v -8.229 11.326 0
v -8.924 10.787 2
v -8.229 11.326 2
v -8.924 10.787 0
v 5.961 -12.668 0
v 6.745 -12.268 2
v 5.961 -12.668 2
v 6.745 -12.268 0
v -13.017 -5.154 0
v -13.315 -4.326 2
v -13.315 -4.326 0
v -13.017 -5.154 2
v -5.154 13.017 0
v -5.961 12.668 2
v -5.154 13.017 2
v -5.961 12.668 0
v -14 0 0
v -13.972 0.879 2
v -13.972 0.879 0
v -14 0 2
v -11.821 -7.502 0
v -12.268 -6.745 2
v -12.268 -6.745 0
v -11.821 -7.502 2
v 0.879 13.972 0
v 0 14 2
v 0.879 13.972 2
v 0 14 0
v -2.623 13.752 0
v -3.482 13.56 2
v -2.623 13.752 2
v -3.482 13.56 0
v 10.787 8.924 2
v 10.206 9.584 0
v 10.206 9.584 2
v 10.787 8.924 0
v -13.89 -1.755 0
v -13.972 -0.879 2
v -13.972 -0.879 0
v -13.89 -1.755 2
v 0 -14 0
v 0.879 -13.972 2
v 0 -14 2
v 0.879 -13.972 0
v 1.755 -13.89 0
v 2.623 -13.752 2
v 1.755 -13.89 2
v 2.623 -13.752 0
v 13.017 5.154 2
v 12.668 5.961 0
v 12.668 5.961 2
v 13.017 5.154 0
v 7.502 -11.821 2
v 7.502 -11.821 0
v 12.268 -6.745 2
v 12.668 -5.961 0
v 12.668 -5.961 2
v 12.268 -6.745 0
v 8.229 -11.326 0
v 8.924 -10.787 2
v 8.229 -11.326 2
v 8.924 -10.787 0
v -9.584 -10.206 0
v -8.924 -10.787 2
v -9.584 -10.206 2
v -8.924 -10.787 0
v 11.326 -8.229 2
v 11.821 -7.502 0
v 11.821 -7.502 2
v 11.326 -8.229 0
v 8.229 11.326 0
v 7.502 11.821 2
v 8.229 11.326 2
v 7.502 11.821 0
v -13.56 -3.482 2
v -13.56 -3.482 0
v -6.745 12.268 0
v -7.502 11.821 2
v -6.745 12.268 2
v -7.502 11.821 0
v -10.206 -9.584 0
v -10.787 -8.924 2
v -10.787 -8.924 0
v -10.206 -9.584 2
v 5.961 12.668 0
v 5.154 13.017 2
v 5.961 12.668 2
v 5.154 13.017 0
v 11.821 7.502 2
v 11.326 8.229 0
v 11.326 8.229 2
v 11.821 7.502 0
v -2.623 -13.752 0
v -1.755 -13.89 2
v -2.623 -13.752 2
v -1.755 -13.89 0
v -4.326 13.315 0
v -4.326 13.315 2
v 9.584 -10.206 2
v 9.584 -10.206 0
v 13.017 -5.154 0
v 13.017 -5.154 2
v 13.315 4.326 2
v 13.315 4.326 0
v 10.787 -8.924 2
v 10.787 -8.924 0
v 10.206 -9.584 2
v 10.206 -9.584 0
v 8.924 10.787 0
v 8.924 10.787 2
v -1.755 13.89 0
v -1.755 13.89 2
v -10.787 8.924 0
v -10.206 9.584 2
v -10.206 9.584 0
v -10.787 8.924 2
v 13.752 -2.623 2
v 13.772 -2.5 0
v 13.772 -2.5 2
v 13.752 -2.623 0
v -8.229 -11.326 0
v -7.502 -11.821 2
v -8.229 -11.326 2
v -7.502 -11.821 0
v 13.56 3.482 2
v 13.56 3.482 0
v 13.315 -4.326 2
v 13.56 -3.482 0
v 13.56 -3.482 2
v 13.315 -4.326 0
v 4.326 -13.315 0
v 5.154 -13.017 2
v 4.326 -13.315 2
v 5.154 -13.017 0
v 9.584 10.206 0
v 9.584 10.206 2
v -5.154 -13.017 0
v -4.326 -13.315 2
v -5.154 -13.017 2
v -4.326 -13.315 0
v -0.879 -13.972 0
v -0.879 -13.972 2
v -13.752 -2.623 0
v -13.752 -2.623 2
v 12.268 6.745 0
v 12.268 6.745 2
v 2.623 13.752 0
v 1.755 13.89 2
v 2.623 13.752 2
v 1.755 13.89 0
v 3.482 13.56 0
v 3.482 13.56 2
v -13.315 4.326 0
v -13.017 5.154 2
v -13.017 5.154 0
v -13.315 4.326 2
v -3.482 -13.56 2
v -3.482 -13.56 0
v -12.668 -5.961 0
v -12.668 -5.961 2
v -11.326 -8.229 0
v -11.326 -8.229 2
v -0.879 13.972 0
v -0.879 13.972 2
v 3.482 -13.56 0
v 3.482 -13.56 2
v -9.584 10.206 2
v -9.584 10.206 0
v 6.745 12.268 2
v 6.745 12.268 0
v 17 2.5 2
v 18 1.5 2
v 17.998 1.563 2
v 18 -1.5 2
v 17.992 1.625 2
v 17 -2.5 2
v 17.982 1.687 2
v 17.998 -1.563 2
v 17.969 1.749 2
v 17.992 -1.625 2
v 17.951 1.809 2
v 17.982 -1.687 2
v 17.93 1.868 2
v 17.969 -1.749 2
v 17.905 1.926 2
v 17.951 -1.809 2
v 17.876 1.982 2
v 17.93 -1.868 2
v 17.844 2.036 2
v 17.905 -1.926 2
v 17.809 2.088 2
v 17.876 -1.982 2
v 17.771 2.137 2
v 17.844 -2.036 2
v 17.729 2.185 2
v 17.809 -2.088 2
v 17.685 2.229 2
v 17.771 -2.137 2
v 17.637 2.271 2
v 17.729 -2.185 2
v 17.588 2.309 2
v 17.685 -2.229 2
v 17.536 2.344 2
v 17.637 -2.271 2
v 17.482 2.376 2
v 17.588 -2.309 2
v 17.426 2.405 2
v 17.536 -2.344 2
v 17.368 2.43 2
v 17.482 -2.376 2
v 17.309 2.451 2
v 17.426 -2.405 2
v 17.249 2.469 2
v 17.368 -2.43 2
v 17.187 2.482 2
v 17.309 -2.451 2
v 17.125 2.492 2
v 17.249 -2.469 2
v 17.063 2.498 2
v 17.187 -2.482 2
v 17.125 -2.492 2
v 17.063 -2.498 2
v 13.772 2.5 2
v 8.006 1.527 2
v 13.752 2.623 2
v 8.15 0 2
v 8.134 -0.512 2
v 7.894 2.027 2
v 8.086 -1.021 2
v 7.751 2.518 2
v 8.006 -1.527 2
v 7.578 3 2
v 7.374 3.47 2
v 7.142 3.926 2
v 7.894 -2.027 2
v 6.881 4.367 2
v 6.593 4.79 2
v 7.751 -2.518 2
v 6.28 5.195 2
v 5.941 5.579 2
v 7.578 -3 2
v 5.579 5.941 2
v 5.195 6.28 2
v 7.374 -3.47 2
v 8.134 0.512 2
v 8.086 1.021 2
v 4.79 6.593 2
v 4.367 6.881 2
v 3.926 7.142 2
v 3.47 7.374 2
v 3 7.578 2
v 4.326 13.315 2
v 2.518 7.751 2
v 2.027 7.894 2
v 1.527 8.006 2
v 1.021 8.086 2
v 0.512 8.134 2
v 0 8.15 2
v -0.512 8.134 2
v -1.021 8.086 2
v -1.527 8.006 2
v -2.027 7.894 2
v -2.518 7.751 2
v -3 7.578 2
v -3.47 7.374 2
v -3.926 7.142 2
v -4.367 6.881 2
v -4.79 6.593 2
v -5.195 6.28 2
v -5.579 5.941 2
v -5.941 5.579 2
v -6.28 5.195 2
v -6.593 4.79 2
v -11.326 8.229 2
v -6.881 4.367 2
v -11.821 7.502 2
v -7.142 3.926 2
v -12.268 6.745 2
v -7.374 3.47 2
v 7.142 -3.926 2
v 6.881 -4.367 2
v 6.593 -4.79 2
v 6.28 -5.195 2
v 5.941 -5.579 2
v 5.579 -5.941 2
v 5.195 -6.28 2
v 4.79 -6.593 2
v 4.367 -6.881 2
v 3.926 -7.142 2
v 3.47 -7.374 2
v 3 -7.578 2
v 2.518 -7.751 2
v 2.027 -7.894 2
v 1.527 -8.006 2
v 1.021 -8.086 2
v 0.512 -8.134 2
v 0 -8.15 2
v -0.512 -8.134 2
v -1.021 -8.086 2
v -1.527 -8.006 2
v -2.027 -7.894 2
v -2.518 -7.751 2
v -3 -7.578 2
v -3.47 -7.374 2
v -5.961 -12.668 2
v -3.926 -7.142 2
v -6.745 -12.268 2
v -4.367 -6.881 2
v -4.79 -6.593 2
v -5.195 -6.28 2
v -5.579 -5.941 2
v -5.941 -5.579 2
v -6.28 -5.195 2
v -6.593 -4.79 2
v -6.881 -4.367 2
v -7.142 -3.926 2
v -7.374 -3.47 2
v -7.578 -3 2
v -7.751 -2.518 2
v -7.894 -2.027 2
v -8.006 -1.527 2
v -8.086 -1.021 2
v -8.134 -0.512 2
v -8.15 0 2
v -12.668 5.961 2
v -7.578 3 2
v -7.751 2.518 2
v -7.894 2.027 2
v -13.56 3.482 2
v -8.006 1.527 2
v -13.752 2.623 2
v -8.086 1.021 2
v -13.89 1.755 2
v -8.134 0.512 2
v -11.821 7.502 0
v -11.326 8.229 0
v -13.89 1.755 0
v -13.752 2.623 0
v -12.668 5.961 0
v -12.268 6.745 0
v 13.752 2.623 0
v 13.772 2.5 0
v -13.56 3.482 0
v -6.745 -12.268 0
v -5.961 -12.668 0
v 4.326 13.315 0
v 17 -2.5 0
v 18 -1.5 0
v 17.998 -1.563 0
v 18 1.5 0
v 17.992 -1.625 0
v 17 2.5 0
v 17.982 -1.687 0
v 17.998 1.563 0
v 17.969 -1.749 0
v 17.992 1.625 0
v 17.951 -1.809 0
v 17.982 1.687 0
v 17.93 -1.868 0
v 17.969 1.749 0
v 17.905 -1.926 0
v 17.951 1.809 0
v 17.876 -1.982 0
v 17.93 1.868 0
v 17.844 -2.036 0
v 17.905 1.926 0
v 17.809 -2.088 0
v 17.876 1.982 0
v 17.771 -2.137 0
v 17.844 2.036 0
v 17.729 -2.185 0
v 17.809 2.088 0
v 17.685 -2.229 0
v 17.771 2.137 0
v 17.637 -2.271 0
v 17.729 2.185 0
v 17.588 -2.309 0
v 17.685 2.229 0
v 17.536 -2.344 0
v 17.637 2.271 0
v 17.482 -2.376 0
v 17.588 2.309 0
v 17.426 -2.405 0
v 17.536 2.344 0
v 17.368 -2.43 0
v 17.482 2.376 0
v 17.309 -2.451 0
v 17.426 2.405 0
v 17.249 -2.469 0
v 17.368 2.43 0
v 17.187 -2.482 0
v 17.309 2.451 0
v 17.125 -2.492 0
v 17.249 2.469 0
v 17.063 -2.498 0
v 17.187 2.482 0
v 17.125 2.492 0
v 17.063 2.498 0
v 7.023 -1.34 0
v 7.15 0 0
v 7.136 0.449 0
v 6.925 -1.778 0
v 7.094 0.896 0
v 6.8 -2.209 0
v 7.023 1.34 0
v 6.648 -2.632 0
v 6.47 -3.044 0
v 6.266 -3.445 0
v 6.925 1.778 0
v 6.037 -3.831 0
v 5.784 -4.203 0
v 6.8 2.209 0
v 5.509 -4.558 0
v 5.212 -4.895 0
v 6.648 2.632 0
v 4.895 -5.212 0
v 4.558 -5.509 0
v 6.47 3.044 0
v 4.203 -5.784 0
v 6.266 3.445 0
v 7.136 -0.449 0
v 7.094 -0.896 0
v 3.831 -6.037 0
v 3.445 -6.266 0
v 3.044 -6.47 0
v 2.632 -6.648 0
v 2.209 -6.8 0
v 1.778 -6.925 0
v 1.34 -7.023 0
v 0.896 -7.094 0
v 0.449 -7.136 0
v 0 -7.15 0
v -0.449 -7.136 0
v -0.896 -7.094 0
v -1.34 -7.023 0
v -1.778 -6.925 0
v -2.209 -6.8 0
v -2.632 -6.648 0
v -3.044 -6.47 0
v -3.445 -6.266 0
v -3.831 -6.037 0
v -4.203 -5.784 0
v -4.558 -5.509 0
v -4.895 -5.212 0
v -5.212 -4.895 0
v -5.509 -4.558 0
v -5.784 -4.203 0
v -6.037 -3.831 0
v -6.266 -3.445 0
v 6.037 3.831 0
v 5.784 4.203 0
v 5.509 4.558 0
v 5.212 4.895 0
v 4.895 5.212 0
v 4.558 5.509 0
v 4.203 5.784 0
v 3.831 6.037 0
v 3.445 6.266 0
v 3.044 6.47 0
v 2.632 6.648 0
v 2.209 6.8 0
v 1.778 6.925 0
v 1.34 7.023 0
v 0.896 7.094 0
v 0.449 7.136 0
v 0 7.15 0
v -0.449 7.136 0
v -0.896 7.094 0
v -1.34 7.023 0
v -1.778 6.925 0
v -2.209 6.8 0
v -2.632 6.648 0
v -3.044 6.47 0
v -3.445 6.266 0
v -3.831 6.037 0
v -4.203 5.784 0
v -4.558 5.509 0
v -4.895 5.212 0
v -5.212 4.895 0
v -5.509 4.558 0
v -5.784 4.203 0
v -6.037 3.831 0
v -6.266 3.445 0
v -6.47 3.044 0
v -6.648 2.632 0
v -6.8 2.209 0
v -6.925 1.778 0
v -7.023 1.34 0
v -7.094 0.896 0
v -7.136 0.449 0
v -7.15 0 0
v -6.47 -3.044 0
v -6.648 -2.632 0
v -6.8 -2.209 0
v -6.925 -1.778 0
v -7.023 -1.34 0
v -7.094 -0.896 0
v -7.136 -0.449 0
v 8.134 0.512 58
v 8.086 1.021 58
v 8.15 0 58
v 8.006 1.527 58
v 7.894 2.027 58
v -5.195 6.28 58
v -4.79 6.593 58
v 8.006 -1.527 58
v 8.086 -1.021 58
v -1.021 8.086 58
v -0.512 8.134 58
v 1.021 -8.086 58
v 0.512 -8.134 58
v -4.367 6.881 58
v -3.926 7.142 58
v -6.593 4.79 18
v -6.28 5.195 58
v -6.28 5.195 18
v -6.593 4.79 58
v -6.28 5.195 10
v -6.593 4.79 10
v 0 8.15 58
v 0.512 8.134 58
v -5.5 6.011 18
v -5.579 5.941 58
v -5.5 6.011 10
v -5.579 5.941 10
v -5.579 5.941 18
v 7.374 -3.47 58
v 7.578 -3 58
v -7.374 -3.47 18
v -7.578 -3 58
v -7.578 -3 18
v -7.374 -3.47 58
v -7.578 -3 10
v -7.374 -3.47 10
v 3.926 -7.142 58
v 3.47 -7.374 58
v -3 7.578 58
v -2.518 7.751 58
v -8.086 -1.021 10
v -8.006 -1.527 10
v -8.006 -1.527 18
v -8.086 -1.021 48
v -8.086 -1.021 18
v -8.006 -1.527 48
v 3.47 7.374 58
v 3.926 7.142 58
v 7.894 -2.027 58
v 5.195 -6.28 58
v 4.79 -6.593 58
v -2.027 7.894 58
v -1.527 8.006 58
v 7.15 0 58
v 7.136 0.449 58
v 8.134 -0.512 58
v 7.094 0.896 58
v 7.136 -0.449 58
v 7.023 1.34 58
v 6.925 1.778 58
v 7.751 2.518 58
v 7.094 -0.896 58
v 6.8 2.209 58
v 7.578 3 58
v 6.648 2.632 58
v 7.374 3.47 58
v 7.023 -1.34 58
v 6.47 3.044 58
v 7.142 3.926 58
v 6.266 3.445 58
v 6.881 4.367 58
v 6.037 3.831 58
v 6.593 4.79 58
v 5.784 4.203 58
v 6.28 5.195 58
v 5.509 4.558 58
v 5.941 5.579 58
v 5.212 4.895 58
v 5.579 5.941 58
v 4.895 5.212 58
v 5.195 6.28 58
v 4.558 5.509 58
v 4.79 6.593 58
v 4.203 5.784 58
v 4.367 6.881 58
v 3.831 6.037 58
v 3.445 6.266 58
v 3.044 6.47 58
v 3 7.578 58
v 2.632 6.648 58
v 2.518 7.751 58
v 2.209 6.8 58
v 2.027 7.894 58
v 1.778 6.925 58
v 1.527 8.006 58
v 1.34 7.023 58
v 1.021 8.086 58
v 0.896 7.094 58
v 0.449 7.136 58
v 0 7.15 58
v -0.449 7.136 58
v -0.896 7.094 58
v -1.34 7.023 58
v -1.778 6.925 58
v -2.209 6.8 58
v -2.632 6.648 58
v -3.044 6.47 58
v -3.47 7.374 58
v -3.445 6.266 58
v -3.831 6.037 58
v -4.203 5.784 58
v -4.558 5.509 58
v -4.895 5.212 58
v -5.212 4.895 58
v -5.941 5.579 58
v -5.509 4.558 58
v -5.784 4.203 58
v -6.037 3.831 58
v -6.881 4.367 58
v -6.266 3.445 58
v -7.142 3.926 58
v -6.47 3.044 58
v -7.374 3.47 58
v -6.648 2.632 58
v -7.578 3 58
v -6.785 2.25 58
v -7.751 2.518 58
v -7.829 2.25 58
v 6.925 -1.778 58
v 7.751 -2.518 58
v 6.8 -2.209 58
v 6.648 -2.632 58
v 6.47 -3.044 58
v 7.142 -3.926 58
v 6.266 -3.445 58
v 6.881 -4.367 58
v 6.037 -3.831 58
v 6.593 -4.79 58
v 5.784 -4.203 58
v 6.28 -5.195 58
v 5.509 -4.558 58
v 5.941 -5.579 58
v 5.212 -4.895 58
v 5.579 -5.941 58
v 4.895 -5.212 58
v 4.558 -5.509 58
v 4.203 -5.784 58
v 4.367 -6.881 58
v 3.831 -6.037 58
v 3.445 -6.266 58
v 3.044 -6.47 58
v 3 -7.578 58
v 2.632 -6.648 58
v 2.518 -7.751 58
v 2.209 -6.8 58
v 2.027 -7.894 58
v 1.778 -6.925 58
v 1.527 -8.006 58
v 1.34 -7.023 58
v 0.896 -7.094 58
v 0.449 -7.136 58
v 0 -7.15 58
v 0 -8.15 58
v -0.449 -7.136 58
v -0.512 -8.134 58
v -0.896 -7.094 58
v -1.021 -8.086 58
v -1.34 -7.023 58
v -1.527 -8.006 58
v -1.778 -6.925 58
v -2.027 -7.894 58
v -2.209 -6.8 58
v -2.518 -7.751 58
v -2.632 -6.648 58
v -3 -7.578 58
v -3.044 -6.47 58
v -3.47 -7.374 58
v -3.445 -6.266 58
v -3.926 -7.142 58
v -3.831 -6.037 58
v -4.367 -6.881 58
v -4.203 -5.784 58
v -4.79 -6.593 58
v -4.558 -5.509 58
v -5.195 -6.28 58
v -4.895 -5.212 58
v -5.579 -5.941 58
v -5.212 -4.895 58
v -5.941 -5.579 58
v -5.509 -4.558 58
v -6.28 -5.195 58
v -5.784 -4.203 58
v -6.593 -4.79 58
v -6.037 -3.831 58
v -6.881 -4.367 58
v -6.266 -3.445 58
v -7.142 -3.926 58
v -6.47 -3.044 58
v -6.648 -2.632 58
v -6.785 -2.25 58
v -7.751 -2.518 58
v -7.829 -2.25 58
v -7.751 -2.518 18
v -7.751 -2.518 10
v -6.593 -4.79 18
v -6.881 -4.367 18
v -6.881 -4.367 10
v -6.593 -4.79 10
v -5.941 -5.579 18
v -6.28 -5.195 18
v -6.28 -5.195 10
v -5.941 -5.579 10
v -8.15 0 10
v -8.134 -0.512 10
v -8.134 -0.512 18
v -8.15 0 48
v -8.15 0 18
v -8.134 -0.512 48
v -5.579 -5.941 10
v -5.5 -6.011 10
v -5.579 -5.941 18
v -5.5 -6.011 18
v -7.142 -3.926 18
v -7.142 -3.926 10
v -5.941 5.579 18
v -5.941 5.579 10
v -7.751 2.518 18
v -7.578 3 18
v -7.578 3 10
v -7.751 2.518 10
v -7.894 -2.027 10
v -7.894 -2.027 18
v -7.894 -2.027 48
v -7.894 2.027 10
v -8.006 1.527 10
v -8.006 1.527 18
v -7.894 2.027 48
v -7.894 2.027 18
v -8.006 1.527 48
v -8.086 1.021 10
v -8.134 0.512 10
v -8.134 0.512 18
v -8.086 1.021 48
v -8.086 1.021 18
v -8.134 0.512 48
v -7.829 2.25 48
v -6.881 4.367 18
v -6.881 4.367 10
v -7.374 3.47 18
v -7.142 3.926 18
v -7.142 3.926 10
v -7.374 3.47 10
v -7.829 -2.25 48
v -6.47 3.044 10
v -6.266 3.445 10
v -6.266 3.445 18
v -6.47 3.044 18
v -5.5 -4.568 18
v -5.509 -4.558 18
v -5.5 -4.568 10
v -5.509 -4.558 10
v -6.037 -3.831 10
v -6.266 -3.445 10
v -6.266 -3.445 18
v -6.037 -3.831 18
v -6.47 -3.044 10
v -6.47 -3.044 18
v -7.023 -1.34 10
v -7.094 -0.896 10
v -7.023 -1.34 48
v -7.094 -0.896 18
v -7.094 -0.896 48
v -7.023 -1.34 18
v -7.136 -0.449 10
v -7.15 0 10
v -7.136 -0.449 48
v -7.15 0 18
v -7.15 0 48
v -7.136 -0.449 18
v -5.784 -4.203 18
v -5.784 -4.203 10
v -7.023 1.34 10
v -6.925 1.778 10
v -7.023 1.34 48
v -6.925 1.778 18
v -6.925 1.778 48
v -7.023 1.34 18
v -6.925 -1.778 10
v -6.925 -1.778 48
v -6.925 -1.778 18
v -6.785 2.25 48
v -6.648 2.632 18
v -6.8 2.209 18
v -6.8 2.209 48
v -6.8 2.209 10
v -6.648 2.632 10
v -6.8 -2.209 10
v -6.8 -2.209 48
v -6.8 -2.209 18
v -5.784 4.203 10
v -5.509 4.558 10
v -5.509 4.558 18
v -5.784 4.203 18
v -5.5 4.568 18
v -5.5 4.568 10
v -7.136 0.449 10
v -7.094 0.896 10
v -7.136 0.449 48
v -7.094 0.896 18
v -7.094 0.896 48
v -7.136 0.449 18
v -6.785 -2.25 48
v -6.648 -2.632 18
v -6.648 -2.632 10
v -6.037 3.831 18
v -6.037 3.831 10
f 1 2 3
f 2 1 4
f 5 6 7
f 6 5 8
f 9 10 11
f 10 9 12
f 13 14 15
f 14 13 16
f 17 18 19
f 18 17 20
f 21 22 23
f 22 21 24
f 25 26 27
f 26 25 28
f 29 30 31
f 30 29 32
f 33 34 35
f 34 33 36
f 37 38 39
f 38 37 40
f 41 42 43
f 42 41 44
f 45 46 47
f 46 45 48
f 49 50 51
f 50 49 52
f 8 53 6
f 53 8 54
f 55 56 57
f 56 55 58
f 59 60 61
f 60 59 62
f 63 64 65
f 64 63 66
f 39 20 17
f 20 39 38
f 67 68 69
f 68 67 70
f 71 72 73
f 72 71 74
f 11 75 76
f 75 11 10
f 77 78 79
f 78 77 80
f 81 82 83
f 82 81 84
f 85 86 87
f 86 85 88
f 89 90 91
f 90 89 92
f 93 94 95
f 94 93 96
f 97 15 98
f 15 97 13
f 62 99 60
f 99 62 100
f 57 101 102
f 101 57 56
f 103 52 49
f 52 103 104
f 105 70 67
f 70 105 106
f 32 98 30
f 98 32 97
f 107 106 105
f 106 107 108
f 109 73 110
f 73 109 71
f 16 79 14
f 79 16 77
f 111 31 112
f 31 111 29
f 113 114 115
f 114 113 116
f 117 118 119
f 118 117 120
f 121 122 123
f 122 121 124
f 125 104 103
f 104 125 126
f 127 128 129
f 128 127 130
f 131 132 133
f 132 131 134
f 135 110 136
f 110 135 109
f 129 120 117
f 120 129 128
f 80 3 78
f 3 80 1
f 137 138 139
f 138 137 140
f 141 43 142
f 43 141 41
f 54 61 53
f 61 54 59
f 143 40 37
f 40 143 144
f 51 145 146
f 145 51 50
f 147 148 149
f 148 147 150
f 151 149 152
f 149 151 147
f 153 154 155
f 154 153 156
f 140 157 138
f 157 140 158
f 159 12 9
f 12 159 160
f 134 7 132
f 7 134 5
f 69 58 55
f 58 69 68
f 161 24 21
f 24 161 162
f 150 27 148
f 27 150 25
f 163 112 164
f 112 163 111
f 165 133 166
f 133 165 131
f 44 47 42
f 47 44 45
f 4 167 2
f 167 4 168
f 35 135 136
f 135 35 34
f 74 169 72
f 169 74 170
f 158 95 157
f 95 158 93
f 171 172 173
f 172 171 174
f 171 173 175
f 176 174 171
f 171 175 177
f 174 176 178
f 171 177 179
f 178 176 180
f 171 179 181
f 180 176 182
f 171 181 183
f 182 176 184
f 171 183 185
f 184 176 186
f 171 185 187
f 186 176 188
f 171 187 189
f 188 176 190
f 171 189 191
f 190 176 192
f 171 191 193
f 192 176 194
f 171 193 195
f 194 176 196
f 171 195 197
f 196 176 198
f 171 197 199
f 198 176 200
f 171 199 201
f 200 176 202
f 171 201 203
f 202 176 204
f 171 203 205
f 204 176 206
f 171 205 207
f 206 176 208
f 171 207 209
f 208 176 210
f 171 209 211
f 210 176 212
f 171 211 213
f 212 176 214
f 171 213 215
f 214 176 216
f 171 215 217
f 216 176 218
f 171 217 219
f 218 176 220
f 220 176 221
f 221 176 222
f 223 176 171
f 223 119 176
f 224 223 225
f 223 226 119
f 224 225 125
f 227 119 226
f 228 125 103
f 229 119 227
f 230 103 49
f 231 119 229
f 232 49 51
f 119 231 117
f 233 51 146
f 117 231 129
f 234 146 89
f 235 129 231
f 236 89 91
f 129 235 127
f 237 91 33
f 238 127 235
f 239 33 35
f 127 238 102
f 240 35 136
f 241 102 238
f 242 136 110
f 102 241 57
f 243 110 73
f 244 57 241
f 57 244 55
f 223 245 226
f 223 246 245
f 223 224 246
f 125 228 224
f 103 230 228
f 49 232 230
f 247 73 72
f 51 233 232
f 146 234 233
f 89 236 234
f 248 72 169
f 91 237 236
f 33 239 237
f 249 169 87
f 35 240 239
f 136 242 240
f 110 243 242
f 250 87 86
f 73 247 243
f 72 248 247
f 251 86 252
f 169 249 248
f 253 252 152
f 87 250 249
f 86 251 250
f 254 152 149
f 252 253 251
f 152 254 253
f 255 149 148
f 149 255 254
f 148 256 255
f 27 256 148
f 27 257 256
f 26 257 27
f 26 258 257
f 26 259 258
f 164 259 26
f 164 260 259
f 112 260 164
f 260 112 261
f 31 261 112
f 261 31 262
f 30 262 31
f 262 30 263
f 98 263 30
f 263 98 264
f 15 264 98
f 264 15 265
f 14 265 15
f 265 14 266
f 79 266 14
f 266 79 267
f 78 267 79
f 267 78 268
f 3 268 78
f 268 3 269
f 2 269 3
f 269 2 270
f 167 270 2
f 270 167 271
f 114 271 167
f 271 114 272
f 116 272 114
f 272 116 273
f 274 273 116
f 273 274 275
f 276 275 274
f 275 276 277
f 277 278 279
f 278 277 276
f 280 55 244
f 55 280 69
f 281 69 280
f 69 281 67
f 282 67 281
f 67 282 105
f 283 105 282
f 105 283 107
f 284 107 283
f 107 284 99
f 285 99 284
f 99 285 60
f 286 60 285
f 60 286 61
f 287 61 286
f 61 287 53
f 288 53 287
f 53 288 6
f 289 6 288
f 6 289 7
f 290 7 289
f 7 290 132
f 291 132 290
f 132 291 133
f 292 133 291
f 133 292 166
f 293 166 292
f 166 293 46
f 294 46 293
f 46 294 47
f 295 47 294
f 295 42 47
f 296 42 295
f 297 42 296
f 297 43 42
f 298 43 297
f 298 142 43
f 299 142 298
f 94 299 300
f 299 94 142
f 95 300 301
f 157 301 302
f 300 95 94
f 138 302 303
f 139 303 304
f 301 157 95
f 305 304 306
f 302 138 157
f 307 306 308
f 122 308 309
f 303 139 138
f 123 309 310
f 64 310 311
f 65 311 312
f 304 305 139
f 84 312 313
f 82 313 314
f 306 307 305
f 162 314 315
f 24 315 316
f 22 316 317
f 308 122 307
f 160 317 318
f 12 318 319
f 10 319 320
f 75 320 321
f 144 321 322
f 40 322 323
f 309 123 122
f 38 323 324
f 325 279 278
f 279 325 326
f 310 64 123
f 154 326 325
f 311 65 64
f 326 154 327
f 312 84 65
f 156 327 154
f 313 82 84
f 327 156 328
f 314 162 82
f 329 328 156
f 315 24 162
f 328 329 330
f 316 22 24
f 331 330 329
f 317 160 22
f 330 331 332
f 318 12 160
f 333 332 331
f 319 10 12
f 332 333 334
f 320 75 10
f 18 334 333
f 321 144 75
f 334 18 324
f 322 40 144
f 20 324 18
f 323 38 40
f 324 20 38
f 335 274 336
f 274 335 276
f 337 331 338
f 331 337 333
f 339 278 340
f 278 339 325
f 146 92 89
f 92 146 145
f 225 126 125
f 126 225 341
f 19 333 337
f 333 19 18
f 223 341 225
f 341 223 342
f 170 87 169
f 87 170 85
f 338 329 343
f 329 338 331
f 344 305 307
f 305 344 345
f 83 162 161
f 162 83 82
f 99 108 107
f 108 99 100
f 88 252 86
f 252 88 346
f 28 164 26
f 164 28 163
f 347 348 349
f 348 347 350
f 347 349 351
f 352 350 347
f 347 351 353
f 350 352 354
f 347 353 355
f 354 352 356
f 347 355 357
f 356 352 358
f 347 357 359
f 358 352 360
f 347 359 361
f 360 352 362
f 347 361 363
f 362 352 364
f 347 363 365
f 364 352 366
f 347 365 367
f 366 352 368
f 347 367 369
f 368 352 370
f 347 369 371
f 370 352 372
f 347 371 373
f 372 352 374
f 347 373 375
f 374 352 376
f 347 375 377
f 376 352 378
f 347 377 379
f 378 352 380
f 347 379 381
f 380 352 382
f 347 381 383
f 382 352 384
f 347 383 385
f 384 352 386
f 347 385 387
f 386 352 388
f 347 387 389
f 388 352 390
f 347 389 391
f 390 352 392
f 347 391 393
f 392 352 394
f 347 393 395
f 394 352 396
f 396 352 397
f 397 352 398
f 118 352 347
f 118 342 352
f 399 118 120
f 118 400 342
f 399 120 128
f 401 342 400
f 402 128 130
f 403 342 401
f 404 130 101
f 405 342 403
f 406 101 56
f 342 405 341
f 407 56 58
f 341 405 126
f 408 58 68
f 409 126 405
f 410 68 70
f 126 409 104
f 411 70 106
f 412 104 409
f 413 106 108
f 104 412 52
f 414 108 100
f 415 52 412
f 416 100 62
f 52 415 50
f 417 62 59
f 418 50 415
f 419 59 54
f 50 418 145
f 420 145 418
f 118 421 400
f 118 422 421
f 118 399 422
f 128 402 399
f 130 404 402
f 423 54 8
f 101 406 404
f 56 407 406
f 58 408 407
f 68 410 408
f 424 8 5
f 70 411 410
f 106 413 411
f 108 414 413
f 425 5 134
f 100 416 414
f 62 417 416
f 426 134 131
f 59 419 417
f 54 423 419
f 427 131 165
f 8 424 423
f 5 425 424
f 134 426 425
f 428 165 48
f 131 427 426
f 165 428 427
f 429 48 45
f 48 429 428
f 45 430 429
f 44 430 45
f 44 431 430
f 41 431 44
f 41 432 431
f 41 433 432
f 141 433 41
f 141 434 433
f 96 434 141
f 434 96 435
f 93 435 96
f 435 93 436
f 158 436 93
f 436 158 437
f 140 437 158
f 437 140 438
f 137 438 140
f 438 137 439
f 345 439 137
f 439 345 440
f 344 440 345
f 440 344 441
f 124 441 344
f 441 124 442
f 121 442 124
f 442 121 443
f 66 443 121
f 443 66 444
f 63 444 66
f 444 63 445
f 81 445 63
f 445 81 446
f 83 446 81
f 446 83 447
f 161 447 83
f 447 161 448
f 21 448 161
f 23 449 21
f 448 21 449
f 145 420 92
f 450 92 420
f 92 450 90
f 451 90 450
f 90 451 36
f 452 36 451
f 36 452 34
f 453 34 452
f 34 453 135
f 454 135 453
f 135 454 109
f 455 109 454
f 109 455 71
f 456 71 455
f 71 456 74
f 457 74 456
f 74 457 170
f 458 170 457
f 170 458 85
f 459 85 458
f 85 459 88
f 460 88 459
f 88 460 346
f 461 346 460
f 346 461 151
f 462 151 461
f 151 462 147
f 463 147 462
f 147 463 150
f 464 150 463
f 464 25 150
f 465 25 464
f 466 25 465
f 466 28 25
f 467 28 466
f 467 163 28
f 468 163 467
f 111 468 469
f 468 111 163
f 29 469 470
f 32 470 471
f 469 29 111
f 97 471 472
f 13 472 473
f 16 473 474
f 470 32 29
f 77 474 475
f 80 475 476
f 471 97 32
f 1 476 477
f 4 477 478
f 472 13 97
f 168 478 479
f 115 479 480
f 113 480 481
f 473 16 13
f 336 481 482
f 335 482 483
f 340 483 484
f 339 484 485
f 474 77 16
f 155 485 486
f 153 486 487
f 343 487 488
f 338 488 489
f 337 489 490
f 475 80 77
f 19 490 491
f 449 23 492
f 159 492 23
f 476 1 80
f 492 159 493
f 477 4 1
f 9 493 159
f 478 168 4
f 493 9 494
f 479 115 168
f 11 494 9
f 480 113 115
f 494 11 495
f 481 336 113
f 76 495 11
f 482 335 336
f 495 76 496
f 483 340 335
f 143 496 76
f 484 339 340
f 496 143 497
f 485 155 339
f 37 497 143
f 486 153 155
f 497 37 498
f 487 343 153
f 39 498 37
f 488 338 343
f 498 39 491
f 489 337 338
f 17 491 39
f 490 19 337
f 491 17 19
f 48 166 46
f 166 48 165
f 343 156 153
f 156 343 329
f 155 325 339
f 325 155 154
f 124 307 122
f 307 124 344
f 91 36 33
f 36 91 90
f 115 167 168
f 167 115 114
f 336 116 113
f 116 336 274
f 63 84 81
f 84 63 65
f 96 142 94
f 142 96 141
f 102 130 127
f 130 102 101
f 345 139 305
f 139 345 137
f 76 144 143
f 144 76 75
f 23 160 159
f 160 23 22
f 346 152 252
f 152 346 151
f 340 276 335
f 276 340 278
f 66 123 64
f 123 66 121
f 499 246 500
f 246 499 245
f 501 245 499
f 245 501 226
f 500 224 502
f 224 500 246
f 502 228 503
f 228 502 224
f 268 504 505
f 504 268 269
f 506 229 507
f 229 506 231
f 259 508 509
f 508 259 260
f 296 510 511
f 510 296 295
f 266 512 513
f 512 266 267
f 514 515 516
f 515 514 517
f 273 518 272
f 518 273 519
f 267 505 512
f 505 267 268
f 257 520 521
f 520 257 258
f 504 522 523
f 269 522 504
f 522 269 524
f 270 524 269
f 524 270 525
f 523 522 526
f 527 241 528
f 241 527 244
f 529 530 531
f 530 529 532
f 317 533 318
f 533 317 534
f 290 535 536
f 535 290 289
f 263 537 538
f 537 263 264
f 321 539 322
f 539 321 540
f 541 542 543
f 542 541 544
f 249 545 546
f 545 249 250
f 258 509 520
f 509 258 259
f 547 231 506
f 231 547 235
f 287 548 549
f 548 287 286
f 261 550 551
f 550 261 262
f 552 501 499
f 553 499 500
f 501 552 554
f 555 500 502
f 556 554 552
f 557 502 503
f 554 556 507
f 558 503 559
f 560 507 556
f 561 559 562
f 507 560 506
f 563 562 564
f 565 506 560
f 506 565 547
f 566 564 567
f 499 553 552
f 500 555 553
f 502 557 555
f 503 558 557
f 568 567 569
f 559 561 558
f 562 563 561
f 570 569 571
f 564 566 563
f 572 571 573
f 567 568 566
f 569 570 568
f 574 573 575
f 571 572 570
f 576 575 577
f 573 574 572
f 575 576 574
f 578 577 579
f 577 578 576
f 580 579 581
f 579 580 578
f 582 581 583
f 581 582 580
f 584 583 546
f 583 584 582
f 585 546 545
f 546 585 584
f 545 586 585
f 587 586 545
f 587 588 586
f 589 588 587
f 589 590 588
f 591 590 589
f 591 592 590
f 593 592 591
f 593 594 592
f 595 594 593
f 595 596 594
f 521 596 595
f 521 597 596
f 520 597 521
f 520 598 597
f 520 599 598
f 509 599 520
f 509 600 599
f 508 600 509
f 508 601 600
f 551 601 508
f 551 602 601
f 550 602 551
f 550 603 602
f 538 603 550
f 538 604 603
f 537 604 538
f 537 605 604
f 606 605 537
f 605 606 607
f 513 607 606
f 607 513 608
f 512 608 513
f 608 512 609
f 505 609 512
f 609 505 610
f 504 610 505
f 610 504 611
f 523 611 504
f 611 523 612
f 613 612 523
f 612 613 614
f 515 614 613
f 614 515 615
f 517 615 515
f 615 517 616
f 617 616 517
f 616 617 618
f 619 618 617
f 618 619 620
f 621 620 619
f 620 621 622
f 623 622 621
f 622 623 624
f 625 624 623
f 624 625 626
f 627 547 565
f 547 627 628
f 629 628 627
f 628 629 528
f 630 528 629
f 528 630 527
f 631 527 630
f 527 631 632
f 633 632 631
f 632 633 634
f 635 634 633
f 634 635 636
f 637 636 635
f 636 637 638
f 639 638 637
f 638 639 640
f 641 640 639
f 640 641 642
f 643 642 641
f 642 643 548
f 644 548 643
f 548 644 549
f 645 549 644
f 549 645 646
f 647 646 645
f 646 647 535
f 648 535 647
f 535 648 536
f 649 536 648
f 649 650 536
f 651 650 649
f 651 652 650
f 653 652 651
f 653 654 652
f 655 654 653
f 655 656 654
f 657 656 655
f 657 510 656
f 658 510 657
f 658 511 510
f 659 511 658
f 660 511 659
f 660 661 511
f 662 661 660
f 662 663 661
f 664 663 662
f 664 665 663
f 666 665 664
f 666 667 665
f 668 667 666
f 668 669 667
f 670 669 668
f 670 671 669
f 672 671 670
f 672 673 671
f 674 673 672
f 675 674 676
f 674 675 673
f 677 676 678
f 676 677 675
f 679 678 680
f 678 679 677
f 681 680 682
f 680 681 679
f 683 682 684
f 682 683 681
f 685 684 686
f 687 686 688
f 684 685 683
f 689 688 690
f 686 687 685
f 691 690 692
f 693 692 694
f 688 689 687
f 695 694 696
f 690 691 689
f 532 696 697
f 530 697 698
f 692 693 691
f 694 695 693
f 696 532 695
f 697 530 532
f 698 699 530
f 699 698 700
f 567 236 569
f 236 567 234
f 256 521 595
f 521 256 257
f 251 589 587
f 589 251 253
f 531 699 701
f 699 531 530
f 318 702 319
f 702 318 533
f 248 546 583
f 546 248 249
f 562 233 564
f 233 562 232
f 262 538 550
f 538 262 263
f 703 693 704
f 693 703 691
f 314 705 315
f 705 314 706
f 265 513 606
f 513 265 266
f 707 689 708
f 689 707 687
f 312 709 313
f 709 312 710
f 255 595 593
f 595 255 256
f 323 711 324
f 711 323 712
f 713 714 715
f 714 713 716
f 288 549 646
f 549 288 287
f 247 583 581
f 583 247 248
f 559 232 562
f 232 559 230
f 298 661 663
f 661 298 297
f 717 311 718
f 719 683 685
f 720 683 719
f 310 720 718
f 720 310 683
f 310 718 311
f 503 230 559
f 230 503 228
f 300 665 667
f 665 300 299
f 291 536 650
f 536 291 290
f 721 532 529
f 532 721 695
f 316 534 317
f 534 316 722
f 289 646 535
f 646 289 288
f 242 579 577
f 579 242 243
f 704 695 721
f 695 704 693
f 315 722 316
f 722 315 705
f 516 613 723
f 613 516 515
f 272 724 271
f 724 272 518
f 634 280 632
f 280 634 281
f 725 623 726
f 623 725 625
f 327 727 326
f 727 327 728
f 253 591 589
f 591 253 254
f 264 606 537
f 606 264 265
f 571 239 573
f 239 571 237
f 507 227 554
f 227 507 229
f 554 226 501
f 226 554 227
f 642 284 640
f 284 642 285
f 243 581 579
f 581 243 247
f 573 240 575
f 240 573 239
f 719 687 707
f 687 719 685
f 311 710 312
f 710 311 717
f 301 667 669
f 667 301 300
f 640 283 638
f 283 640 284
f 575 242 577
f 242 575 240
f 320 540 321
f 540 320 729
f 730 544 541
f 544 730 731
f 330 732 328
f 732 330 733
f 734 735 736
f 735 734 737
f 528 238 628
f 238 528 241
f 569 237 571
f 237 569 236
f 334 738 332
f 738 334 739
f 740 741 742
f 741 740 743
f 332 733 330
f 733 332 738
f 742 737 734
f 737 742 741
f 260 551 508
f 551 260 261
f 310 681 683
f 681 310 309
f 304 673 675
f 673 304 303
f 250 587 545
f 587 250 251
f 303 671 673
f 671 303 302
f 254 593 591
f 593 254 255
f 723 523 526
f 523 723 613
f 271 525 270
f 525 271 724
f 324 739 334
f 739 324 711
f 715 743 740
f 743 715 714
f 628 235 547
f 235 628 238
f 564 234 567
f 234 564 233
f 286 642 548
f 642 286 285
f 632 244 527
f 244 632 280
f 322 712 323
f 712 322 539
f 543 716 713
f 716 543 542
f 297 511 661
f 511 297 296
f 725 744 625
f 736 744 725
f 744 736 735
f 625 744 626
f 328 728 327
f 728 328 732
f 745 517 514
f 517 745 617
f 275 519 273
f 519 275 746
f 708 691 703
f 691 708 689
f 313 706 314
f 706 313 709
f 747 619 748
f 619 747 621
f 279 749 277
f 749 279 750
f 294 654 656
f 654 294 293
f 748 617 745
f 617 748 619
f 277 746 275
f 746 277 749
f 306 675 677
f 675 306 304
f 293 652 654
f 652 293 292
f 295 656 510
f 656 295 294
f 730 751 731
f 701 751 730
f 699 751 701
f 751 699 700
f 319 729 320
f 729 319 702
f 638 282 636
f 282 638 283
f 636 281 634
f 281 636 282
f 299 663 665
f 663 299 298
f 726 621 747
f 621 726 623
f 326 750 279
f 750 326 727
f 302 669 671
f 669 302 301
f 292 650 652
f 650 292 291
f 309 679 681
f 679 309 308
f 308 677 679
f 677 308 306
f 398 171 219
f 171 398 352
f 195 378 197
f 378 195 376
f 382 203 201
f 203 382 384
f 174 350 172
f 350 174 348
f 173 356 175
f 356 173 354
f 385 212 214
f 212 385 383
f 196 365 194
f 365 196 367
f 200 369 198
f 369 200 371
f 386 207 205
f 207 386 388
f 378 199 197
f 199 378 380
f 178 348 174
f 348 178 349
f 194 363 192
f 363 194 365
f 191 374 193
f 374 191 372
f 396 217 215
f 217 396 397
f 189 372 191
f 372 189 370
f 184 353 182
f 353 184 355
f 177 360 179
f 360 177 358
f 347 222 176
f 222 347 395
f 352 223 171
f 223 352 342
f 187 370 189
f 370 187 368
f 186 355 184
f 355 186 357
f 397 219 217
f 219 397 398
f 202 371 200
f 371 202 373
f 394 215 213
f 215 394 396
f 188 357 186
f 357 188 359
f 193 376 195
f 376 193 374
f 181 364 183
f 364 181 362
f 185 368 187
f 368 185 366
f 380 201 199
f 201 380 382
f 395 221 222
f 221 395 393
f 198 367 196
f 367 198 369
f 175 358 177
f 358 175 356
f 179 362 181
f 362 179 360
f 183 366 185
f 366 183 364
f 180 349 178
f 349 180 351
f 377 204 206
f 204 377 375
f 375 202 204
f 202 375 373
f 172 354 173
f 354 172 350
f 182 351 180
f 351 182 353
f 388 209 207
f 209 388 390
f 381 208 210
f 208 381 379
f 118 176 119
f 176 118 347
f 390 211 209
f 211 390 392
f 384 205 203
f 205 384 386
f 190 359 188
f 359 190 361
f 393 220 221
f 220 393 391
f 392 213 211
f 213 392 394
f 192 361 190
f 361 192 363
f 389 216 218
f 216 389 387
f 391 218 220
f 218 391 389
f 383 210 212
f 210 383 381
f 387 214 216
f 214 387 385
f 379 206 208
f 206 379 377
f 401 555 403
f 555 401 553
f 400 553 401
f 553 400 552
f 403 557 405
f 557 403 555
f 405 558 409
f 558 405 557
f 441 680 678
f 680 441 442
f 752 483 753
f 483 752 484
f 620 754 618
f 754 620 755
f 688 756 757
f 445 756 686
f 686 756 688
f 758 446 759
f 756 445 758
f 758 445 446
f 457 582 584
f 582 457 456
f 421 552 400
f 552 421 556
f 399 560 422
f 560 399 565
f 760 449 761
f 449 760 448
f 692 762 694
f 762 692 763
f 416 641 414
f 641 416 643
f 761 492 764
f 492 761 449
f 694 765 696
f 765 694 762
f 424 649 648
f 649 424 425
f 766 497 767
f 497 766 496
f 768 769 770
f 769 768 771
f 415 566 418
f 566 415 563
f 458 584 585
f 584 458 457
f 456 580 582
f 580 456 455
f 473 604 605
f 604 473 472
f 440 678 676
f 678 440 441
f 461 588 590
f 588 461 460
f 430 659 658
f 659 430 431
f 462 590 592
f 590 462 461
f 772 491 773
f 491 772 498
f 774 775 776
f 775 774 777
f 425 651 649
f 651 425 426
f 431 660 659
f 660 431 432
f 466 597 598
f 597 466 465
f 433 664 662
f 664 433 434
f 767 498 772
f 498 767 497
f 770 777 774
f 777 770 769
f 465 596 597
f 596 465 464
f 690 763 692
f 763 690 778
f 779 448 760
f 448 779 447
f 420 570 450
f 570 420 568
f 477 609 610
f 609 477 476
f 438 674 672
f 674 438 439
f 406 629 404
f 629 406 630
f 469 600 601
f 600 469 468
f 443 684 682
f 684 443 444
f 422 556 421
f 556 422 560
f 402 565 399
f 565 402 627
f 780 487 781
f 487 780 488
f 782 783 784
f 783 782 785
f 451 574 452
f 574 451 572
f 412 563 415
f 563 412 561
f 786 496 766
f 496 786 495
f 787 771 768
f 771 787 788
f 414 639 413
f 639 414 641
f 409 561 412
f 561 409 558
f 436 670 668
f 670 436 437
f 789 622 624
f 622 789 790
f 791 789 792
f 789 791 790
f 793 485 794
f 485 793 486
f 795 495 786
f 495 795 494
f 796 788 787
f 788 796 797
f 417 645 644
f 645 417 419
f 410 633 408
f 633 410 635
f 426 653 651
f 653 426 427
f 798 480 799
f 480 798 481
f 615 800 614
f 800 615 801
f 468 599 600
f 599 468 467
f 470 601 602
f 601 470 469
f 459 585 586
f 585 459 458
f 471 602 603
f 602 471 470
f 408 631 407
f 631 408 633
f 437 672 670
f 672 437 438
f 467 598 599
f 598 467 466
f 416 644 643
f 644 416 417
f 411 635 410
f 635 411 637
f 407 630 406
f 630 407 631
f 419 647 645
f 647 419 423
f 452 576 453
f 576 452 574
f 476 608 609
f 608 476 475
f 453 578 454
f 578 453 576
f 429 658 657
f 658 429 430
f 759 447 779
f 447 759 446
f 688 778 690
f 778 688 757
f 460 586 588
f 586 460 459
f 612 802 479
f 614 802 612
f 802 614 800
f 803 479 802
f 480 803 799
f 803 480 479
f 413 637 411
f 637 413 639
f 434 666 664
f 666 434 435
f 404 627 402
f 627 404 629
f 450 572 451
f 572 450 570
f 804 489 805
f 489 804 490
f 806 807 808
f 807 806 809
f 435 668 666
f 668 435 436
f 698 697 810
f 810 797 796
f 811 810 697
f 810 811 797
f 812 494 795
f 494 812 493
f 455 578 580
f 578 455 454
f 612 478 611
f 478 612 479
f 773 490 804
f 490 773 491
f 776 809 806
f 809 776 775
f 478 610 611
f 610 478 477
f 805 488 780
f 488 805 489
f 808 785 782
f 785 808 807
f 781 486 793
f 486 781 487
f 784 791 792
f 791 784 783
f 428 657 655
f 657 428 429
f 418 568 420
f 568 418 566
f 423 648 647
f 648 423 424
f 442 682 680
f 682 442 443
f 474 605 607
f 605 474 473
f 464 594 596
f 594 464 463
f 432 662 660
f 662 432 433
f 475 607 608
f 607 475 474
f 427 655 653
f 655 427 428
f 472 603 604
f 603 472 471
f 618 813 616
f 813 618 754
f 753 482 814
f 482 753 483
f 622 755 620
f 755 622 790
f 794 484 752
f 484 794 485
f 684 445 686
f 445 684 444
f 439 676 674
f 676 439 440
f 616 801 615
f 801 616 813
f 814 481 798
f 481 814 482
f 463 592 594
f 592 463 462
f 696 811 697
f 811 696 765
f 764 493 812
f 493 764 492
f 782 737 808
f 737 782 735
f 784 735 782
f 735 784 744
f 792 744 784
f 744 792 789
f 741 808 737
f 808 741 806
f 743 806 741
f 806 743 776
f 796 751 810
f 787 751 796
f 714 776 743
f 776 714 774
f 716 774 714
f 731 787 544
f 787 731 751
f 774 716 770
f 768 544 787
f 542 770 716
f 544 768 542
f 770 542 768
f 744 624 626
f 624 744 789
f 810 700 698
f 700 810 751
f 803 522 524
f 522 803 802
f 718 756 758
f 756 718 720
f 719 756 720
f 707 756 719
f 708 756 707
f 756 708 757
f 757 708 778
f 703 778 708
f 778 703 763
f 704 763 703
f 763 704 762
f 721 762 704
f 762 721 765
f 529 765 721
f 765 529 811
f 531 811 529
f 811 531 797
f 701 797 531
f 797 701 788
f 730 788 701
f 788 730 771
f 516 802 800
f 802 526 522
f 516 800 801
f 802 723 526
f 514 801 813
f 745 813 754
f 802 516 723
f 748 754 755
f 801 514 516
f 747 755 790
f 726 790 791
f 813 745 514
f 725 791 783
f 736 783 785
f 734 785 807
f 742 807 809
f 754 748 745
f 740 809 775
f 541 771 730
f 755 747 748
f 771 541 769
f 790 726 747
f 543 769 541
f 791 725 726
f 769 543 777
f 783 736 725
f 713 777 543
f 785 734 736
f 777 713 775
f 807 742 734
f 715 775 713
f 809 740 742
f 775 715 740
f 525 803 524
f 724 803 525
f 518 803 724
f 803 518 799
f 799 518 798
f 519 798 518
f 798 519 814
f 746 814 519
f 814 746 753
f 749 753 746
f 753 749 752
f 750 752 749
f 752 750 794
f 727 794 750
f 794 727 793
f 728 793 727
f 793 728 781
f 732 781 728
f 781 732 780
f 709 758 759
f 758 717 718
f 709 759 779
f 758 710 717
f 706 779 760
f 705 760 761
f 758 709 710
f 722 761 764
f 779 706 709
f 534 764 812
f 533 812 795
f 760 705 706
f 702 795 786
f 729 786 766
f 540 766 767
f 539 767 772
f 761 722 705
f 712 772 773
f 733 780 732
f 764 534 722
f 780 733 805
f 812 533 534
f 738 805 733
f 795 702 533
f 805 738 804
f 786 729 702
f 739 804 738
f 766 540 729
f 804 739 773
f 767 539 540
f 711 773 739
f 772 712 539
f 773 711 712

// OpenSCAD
$fn=100;

difference() {
    union() {
        cylinder(d=28, h=2);
        cylinder(d=16.3, h=58);
        hull() {
            translate([17,1.5,0]) cylinder(d=2, h=2);
            translate([17,-1.5,0]) cylinder(d=2, h=2);
            translate([13,1.5,0]) cylinder(d=2, h=2);
            translate([13,-1.5,0]) cylinder(d=2, h=2);
        }
    }
    cylinder(d=14.3, h=58);
    translate([-10,-2.25,48]) cube([4.5, 4.5, 10]);
    translate([-10,-50,10]) cube([4.5, 100, 8]);
 }
